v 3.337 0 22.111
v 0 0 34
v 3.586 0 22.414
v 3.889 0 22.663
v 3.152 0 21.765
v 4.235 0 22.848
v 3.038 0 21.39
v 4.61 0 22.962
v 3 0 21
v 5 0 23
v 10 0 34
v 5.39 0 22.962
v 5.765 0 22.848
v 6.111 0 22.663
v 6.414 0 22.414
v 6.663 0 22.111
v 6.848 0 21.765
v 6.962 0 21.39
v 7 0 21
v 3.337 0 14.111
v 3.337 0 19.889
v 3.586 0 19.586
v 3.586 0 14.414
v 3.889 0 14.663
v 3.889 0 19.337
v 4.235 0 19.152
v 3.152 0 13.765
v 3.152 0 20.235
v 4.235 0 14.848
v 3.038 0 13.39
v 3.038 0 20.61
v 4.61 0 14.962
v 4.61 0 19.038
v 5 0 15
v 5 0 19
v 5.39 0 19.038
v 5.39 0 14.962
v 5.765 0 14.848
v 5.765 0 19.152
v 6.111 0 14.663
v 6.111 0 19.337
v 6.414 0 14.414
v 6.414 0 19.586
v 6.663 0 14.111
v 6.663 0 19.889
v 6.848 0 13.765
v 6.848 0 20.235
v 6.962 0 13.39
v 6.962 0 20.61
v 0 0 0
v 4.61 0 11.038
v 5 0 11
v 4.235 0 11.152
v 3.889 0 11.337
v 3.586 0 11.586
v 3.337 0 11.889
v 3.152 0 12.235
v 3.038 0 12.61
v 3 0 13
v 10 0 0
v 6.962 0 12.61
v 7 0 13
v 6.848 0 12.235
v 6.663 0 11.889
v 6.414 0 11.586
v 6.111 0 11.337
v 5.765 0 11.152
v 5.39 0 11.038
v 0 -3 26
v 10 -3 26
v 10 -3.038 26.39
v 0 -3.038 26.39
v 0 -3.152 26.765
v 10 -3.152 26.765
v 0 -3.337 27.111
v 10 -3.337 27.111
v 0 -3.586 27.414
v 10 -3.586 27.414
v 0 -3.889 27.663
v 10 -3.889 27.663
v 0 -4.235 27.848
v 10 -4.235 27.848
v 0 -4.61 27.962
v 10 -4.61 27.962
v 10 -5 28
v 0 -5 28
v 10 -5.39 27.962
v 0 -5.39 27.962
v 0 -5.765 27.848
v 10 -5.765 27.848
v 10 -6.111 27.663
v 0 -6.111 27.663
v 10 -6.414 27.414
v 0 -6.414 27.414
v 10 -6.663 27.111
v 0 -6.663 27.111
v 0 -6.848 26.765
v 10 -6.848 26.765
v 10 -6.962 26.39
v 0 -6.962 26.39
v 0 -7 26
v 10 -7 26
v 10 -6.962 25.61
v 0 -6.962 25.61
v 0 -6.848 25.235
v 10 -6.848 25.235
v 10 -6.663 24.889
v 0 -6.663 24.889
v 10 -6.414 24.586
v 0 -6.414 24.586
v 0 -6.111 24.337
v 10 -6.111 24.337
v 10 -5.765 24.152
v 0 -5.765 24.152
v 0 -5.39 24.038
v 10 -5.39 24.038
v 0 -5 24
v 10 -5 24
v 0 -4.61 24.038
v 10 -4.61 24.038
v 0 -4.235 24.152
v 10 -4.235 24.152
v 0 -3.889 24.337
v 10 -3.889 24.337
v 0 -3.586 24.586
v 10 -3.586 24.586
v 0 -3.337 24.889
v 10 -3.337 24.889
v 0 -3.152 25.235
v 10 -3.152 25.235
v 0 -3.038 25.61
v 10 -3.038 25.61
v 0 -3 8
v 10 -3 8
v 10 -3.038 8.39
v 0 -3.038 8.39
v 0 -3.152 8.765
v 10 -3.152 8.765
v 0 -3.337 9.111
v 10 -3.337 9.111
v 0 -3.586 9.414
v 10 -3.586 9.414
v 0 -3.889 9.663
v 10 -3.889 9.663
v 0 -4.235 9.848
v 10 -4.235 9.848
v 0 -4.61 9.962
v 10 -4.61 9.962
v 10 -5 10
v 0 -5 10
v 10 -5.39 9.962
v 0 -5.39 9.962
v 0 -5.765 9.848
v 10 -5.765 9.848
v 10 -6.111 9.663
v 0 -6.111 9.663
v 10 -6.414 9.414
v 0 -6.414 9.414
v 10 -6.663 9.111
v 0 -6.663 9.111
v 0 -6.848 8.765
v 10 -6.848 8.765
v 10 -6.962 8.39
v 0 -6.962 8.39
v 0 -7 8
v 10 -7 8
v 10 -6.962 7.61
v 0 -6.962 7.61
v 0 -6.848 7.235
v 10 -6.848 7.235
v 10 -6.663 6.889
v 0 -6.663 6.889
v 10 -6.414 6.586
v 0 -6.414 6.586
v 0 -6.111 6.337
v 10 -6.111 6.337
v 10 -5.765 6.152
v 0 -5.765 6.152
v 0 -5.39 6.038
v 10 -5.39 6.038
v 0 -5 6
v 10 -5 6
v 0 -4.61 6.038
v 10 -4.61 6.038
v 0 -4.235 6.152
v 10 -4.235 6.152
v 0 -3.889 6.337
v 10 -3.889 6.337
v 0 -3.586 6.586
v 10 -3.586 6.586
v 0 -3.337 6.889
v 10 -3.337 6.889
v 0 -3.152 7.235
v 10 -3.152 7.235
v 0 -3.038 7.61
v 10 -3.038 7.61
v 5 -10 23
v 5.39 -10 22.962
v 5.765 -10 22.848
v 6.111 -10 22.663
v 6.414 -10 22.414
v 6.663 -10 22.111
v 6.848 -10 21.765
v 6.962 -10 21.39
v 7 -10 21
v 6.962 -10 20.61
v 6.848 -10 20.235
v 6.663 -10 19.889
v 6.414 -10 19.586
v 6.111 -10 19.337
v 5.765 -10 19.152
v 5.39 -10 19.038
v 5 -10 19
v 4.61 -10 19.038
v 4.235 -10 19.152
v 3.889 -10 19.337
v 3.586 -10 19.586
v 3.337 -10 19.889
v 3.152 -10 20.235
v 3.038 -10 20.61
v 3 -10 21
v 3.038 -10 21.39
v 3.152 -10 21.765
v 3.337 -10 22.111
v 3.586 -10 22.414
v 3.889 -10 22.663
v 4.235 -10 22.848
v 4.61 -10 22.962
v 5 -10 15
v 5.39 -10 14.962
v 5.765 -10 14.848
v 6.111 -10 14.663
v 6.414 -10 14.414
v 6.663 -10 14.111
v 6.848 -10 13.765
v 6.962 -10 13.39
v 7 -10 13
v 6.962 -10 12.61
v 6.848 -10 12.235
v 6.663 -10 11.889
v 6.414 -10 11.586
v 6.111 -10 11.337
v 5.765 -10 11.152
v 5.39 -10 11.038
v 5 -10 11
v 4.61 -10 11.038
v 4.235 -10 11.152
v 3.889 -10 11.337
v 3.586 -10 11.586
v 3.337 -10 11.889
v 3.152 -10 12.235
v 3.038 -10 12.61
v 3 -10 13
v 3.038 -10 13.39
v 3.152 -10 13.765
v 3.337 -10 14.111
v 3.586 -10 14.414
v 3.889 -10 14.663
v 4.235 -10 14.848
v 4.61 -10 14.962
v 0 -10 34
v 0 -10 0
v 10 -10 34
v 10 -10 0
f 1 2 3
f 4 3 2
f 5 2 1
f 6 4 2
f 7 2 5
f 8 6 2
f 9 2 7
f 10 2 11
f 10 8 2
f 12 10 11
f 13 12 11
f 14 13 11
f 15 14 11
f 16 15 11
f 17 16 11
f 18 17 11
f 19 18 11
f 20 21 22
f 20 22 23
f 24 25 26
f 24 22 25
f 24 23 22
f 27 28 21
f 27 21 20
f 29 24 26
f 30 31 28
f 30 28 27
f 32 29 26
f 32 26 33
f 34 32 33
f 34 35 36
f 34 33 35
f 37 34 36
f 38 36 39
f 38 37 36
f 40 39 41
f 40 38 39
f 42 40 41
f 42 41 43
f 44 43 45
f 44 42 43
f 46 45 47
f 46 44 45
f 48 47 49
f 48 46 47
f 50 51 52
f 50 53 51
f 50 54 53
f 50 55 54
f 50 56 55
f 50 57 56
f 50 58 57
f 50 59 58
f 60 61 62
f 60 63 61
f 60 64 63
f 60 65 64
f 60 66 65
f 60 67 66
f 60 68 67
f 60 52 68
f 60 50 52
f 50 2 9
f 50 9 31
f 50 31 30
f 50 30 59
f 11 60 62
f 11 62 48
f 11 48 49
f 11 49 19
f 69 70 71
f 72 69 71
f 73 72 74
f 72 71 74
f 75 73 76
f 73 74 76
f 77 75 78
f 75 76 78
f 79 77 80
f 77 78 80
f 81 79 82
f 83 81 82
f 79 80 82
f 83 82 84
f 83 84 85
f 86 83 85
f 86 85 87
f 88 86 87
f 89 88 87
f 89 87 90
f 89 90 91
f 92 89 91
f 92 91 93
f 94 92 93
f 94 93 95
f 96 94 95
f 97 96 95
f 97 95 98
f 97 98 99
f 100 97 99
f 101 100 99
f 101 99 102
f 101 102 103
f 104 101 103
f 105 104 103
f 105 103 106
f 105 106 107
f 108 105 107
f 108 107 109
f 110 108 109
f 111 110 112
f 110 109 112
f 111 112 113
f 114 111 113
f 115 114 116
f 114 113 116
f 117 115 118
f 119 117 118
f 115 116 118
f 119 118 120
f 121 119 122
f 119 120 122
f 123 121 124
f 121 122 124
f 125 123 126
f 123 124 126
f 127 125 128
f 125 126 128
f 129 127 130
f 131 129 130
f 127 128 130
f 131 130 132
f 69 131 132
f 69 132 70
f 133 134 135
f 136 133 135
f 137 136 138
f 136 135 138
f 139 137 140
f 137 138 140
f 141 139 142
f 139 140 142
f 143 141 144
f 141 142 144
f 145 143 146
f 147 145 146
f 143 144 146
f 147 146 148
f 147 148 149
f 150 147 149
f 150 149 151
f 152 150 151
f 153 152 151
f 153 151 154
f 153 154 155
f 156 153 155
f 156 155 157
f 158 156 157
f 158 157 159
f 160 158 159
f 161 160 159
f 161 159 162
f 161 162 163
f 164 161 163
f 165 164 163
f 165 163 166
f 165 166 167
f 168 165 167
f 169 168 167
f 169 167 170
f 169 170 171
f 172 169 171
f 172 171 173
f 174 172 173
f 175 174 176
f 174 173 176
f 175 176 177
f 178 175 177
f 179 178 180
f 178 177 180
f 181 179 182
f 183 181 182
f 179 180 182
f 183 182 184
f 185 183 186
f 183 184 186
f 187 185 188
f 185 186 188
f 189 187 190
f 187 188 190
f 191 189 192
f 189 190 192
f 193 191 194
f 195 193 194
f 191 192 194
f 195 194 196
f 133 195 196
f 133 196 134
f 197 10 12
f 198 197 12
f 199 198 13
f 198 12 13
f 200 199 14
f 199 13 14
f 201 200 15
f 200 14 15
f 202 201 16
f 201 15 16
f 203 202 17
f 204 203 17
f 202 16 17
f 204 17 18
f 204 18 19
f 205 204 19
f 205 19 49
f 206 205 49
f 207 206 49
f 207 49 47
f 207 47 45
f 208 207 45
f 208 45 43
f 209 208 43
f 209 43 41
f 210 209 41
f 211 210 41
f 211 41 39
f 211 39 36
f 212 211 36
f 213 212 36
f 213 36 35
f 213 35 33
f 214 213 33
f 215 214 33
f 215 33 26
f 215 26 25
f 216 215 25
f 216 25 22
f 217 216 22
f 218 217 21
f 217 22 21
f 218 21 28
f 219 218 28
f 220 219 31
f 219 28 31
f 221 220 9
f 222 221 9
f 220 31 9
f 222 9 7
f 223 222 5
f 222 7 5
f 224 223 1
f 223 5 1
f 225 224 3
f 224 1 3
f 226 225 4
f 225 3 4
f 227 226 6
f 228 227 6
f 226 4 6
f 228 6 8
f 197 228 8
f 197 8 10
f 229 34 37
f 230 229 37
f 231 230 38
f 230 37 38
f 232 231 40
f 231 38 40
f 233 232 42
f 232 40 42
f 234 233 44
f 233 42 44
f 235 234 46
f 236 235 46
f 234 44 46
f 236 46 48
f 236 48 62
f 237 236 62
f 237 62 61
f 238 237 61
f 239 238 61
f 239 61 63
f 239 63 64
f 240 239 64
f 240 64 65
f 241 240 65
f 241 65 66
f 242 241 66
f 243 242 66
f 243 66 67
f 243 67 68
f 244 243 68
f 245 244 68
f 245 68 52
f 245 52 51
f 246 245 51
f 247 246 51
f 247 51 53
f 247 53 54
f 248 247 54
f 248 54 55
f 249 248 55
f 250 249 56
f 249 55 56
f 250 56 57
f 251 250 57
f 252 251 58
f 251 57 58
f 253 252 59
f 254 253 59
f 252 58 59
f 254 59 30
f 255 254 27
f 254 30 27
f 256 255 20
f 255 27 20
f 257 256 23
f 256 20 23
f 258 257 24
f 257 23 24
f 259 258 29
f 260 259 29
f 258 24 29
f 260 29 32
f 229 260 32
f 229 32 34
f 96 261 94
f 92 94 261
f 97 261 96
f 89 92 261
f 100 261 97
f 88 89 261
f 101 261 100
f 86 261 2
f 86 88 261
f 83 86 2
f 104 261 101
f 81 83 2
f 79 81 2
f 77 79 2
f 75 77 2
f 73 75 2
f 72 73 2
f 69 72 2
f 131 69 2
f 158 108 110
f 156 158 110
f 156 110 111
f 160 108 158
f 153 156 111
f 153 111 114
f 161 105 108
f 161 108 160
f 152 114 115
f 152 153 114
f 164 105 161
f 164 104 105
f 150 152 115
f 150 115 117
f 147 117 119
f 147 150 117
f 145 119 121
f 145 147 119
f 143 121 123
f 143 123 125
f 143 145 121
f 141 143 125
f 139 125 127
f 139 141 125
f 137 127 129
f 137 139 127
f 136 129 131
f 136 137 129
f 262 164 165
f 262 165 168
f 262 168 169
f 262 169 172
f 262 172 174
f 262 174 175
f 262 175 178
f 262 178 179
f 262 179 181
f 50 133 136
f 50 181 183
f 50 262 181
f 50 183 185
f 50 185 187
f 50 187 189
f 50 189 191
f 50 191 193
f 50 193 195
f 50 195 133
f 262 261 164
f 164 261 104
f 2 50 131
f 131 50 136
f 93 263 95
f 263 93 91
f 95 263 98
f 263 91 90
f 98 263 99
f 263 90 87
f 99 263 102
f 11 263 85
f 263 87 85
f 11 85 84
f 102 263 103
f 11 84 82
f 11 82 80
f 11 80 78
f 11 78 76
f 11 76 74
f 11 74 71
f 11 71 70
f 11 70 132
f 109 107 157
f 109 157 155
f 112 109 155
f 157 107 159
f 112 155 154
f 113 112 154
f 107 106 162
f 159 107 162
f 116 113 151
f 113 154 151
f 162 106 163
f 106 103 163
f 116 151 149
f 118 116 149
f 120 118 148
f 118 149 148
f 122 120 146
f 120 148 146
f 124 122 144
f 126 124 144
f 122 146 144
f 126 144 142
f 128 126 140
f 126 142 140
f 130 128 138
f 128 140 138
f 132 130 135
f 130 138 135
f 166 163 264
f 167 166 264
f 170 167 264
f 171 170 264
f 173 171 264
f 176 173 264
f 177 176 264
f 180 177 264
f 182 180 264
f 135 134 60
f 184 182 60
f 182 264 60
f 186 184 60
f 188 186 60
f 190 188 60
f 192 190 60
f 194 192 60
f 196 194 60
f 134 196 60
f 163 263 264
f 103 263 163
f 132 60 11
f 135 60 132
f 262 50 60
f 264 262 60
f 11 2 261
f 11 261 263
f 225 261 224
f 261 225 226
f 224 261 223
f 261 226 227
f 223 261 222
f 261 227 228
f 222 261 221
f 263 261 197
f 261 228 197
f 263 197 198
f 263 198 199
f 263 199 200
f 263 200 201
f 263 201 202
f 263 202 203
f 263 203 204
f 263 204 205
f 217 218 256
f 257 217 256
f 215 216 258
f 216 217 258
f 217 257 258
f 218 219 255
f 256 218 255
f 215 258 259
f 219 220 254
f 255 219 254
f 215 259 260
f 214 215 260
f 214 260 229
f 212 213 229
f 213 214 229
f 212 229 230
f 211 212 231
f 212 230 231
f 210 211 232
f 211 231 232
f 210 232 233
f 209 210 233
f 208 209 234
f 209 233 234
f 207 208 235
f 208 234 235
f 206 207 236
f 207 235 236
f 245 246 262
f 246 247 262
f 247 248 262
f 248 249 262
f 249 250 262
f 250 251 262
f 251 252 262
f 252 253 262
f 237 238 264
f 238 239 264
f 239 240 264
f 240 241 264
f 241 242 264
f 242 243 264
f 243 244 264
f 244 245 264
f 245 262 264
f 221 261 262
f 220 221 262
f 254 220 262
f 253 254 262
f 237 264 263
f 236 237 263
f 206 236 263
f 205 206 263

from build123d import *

# Parameters (mm, degrees)
SKETCH_1_W          = 10
SKETCH_1_H          = 10
EXTRUDE_1_DEPTH     = 34
SKETCH_2_R          = 2
CUT_EXTRUDE_1_DEPTH = 37.823905279
SKETCH_3_R          = 2
CUT_EXTRUDE_2_DEPTH = 37.823905279


with BuildPart() as part:
    # 草图1 → 凸台-拉伸1 (new body)
    with BuildSketch(Plane.XY):
        with Locations((5, -5)):
            Rectangle(SKETCH_1_W, SKETCH_1_H)
    extrude(amount=EXTRUDE_1_DEPTH)

    # 草图2 → 切除-拉伸1 (cut, through all)
    with BuildSketch(Plane(origin=(10, 0, 0), x_dir=(0, 0, -1), z_dir=(1, 0, 0))):
        with Locations(Location((-26, -5, 0), (0, 0, 90))):
            Circle(SKETCH_2_R)
        with Locations(Location((-8, -5, 0), (0, 0, 90))):
            Circle(SKETCH_2_R)
    extrude(amount=-CUT_EXTRUDE_1_DEPTH, mode=Mode.SUBTRACT)

    # 草图3 → 切除-拉伸2 (cut, through all)
    with BuildSketch(Plane(origin=(0, 0, 0), x_dir=(1, 0, 0), z_dir=(0, 1, 0))):
        with Locations(Location((5, -13, 0), (0, 0, 270))):
            Circle(SKETCH_3_R)
        with Locations(Location((5, -21, 0), (0, 0, 270))):
            Circle(SKETCH_3_R)
    extrude(amount=-CUT_EXTRUDE_2_DEPTH, mode=Mode.SUBTRACT)


solid = part.part
